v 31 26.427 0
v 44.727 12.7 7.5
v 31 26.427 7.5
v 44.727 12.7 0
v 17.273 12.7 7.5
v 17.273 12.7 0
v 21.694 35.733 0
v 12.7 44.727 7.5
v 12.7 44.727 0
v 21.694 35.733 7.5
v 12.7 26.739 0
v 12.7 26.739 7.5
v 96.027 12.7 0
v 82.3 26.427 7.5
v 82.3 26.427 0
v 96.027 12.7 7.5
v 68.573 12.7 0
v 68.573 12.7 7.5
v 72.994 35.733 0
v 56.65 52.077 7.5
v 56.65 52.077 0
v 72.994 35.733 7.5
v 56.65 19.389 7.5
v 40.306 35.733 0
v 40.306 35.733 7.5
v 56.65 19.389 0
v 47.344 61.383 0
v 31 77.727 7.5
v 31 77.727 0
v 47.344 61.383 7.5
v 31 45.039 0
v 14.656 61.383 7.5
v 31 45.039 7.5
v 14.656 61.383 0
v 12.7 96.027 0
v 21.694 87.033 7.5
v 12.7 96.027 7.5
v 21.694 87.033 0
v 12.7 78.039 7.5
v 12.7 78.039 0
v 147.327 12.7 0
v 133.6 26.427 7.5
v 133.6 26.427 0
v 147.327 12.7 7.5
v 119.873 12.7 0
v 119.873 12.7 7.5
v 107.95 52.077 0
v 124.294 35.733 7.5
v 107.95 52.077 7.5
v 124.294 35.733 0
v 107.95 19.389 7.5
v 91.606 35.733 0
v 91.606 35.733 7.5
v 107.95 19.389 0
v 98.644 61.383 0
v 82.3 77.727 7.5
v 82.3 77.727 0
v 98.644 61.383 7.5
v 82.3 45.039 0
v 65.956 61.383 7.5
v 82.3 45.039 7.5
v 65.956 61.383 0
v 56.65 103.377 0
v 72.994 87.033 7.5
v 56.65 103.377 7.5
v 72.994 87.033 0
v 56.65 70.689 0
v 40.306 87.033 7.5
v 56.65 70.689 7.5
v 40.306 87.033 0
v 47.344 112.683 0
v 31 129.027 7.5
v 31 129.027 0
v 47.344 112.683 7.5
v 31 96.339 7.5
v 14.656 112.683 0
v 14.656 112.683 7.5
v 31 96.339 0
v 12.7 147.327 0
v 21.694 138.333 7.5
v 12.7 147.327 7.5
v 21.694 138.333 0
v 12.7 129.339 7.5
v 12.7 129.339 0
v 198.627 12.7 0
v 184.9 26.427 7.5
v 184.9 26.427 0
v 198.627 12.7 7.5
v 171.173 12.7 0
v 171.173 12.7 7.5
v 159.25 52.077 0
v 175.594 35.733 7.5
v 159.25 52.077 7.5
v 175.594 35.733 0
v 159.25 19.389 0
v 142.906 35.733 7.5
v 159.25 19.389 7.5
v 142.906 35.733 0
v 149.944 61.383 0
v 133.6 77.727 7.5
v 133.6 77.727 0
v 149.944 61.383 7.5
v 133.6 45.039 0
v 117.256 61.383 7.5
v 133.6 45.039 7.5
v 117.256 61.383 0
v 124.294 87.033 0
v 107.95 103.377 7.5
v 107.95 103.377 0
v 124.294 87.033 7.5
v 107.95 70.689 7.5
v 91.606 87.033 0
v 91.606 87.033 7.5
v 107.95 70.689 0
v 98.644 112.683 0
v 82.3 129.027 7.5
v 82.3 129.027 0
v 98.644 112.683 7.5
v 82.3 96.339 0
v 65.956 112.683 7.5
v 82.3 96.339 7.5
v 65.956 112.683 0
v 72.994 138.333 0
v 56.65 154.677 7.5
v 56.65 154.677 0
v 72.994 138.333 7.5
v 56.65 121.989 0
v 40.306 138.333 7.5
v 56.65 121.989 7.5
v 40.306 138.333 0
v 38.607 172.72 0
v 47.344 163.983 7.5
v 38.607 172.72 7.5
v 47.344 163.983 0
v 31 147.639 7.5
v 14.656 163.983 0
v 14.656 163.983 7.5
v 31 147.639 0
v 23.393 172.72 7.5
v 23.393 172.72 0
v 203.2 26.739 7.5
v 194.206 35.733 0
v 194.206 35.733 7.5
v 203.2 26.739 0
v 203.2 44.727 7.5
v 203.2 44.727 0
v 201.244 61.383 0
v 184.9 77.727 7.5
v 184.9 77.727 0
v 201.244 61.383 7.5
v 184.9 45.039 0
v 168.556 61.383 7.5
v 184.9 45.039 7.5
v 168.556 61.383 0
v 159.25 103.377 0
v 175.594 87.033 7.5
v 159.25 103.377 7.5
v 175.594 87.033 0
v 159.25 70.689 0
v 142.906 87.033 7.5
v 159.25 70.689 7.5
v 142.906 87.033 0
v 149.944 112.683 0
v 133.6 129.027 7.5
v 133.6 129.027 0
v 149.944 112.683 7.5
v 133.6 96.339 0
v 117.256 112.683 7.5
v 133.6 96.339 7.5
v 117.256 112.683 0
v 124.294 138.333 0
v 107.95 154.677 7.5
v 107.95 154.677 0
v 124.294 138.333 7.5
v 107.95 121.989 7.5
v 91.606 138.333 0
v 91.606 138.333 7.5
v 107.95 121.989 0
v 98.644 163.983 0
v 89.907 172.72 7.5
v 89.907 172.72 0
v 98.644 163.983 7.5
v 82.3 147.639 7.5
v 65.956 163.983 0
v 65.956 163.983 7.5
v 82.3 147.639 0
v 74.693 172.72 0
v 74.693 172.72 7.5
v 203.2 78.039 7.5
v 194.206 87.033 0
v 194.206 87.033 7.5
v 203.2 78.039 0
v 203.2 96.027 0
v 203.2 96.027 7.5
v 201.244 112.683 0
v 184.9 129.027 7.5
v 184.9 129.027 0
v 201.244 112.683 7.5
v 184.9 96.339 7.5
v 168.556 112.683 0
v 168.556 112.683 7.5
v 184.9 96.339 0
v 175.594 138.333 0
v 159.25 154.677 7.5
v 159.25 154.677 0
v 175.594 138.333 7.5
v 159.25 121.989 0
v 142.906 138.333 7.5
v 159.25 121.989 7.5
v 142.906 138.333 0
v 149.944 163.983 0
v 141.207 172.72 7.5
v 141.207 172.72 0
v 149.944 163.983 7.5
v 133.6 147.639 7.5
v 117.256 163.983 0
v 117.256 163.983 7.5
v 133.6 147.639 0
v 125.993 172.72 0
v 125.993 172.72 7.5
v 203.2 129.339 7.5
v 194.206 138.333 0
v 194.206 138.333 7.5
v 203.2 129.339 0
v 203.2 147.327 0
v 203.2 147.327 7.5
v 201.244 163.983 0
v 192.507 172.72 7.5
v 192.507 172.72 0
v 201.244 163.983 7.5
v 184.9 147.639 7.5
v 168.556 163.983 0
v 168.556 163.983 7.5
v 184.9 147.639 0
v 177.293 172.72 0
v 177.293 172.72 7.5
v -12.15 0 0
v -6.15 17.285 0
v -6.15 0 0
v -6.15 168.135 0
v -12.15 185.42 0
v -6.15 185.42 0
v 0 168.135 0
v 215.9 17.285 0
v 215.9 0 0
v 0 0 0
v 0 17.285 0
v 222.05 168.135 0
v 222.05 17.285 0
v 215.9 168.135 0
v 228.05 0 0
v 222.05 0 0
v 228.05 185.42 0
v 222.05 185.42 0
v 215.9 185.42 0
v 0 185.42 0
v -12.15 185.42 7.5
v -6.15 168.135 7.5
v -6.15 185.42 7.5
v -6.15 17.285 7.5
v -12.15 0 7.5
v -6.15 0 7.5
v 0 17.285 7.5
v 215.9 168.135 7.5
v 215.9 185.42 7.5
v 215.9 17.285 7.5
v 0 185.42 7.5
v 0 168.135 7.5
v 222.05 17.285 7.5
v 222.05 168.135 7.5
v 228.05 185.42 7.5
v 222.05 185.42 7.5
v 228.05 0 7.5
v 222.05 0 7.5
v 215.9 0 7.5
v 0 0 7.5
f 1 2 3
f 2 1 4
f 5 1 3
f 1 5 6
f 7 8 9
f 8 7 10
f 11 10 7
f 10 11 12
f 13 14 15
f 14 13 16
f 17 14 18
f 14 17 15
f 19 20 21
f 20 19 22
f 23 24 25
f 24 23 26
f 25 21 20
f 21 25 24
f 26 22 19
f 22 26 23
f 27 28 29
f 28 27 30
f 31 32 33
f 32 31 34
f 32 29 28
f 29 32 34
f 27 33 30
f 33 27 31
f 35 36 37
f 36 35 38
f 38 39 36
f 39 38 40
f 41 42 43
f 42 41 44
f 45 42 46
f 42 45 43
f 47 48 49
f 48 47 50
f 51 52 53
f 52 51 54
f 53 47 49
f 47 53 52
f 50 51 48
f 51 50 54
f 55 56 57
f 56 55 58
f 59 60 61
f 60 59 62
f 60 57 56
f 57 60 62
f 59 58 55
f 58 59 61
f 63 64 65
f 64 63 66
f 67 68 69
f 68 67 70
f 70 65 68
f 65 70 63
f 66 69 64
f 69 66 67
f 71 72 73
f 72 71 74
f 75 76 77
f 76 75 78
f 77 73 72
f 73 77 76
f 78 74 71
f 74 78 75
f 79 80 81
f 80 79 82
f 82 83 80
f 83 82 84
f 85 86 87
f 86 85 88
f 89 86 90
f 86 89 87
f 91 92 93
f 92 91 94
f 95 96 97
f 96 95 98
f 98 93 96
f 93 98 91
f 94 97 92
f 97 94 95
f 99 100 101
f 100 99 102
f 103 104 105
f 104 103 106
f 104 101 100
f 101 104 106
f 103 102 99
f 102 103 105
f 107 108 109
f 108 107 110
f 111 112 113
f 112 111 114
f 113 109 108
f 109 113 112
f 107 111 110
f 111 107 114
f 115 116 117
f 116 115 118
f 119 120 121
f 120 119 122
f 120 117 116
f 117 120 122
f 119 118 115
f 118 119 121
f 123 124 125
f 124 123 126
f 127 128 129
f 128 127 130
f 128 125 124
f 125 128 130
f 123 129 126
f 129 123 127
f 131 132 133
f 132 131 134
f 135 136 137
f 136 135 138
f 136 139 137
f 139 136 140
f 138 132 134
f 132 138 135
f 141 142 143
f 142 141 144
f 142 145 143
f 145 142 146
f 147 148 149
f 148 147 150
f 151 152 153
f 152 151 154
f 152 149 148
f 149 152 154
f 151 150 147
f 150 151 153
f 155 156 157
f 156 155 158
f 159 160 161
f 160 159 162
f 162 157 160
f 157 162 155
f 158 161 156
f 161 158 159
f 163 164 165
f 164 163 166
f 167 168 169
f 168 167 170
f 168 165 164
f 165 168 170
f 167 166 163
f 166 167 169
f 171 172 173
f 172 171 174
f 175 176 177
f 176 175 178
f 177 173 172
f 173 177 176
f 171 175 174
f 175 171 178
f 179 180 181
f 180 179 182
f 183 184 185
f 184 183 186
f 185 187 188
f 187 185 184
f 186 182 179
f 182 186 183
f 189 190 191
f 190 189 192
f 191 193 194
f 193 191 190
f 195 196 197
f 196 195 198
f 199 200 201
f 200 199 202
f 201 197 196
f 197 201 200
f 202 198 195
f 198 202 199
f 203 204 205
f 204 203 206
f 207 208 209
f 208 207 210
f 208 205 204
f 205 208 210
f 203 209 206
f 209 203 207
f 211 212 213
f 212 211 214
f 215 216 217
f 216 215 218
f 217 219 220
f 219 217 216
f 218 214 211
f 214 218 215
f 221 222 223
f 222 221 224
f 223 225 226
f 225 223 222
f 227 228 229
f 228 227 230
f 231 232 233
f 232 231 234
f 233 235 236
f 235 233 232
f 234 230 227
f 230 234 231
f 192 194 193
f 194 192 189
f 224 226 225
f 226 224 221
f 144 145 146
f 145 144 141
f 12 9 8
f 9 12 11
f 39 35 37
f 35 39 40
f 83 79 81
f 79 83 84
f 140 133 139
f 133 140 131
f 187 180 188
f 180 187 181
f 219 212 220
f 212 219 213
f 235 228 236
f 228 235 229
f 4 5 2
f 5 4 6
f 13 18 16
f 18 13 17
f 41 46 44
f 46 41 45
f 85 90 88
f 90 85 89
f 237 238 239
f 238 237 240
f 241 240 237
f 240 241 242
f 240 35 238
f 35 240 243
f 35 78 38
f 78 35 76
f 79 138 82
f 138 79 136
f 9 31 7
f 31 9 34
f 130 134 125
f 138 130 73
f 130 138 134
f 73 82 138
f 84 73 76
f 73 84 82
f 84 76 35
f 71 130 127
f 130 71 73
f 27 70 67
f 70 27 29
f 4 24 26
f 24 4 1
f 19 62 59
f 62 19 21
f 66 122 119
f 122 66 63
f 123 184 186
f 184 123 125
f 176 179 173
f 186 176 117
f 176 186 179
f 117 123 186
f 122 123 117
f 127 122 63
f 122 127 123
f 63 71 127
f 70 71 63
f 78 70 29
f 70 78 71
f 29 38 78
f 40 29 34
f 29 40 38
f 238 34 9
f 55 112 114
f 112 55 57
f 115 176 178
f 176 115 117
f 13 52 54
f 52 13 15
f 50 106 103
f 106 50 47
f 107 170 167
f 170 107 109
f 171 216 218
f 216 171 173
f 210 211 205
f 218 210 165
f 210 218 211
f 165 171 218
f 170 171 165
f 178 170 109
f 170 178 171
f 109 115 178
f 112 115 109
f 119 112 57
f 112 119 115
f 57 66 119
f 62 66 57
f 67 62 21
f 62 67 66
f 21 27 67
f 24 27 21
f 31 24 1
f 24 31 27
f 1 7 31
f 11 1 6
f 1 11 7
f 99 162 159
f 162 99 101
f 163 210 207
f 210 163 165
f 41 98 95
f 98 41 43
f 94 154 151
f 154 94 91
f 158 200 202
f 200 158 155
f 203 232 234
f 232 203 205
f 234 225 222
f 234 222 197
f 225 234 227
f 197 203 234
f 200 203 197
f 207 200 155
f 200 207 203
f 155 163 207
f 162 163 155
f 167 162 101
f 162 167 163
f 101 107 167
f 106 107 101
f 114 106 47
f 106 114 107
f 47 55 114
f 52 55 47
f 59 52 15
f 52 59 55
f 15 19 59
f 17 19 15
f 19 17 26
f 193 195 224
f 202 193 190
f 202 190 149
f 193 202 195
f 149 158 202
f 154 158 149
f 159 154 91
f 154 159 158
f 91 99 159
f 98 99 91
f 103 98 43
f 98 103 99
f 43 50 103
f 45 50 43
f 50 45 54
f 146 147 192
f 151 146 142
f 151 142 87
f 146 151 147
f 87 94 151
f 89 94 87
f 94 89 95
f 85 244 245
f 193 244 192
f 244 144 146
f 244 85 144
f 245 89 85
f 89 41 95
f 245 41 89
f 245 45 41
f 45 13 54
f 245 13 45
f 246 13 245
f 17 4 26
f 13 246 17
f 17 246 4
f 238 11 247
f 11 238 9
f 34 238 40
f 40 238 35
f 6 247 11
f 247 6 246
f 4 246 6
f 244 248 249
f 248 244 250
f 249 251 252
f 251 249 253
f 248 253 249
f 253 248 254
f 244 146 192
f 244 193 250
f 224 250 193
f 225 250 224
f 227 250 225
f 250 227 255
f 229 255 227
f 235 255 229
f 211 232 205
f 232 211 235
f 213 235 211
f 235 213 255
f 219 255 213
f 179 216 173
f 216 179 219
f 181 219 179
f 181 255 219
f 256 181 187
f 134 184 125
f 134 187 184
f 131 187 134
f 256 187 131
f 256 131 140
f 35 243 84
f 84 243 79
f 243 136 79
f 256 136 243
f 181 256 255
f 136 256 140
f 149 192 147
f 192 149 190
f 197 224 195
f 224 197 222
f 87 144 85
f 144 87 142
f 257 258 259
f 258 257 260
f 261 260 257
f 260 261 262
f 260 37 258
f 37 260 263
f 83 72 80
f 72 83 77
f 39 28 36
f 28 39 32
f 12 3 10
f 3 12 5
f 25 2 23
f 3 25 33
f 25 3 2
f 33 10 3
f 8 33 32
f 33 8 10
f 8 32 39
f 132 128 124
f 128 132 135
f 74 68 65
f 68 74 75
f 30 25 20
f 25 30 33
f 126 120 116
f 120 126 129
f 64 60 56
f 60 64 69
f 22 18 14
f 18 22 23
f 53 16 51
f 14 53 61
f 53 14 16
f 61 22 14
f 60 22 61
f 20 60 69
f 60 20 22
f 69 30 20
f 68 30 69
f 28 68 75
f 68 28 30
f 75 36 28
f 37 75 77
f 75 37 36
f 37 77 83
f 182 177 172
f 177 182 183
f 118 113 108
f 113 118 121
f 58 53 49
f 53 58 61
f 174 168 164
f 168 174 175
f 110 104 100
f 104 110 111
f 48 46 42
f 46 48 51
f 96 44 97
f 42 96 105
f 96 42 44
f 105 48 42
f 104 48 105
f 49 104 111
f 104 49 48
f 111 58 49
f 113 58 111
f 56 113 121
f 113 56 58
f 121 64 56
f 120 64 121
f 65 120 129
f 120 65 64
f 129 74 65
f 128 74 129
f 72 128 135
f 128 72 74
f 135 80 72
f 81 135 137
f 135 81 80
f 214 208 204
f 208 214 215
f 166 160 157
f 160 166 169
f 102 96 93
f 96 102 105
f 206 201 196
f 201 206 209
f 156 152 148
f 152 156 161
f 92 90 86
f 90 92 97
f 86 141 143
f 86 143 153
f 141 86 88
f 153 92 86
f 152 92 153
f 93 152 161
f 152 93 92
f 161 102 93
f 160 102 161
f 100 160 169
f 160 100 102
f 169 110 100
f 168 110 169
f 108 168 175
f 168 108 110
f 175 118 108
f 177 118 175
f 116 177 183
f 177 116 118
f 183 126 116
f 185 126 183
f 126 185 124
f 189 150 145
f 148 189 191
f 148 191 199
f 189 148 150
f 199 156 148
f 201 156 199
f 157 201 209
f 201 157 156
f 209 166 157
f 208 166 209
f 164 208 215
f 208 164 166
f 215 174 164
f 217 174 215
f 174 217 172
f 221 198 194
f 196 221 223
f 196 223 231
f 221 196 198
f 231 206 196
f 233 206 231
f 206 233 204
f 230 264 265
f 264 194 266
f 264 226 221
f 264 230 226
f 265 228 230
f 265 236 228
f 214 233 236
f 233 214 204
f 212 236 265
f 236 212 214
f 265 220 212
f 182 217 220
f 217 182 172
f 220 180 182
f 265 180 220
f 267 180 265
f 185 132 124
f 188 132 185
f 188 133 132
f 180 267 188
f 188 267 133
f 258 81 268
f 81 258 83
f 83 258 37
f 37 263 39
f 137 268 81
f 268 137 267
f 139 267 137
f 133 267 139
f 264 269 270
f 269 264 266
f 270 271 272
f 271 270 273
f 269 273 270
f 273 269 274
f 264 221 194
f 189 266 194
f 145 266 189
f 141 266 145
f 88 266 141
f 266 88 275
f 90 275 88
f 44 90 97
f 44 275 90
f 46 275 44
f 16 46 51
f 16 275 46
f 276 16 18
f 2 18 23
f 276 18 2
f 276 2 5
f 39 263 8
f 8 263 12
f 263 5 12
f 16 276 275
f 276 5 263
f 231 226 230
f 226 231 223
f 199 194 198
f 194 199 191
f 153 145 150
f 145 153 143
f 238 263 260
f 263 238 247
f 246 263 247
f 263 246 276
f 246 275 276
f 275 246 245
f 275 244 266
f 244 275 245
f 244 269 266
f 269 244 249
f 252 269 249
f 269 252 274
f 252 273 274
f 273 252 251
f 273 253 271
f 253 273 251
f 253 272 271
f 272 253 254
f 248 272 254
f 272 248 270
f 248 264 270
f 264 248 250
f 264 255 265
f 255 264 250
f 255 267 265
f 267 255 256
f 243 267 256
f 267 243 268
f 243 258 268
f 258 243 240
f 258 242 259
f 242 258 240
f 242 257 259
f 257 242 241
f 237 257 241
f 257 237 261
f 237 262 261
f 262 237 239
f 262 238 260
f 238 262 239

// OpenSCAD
// file: crosshatch.scad
module cross_hatch_grid(width, height, depth, cell_size, line_thickness, angle=45) {
    // Calculate the diagonal length of the bounding rectangle
    // This ensures our rotated grid covers the entire rectangle
    diagonal = sqrt(pow(width, 2) + pow(height, 2));
    
    difference() {
        // Outer boundary cube
        translate([0, 0, -0.01])
            cube([width, height, depth + 0.02]);
        
        // Rotated grid
        translate([width/2, height/2, -0.5])
        rotate([0, 0, angle]) 
        translate([-diagonal/2, -diagonal/2, 0])
        {
            // Create the grid pattern by subtracting cells from a solid block
            difference() {
                // Solid block covering the entire area
                cube([diagonal, diagonal, depth + 1]);
                
                // Create a grid of cells to subtract
                for (x = [0 : cell_size + line_thickness : diagonal]) {
                    for (y = [0 : cell_size + line_thickness : diagonal]) {
                        translate([x, y, -0.5])
                            cube([cell_size, cell_size, depth + 2]);
                    }
                }
            }
        }
    }
}
// file: dimensions.scad
INCHES_TO_MM = 25.4;
SHELF_THICKNESS = 7.5;
SHELF_DEPTH = 7.3 * INCHES_TO_MM;
// main file
include <dimensions.scad>
include <crosshatch.scad>

SHELF_WIDTH = 8.5 * INCHES_TO_MM;
INCUT_DEPTH = 150.85;


module shelf_2d() {
   polygon(points=[[0,0], [SHELF_WIDTH,0], [SHELF_WIDTH, SHELF_DEPTH], [0, SHELF_DEPTH]]);
   

}

module overhang(overhang_depth) {
    lower_incut_offset = (SHELF_DEPTH - INCUT_DEPTH) / 2;
    incut_width = 6.15;

    polygon([[0, lower_incut_offset], [-incut_width, lower_incut_offset], [-incut_width, SHELF_DEPTH - lower_incut_offset], [0, SHELF_DEPTH - lower_incut_offset]]);
    
    overhang_width = 6;
    overhang_offset = (SHELF_DEPTH - overhang_depth) / 2;
    translate([-incut_width, 0, 0]) {
        polygon([
            [0, overhang_offset],
            [-overhang_width, overhang_offset],
            [-overhang_width, SHELF_DEPTH - overhang_offset],
            [0, SHELF_DEPTH - overhang_offset]
        ]);
    }
}

module overhang_lower() {
    overhang(overhang_depth=155.5);
}

module overhang_upper() {
    overhang(overhang_depth=SHELF_DEPTH);
}

module lower_shelf_2d() {
    union() {
        shelf_2d();
        overhang_lower();
        translate([SHELF_WIDTH, 0, 0]) {
            mirror([1, 0, 0]) {
                overhang_lower();
            }
        }
    }
}

module upper_shelf_2d() {
    union() {
        shelf_2d();
        overhang_upper();
        translate([SHELF_WIDTH, 0, 0]) {
            mirror([1, 0, 0]) {
                overhang_upper();
            }
        }
    }
}
    

module shelf_3d() {
    difference() {
    linear_extrude(height=SHELF_THICKNESS) upper_shelf_2d();
    translate([INCHES_TO_MM/2, INCHES_TO_MM/2, -5]) {
        cross_hatch_grid(
            width=SHELF_WIDTH - INCHES_TO_MM,
            height=SHELF_DEPTH-INCHES_TO_MM,
            depth=50,
            cell_size=INCHES_TO_MM*.91,
            line_thickness=INCHES_TO_MM/1.93,
            angle=45);
        }
   }
}

shelf_3d();
//overhang_upper();
